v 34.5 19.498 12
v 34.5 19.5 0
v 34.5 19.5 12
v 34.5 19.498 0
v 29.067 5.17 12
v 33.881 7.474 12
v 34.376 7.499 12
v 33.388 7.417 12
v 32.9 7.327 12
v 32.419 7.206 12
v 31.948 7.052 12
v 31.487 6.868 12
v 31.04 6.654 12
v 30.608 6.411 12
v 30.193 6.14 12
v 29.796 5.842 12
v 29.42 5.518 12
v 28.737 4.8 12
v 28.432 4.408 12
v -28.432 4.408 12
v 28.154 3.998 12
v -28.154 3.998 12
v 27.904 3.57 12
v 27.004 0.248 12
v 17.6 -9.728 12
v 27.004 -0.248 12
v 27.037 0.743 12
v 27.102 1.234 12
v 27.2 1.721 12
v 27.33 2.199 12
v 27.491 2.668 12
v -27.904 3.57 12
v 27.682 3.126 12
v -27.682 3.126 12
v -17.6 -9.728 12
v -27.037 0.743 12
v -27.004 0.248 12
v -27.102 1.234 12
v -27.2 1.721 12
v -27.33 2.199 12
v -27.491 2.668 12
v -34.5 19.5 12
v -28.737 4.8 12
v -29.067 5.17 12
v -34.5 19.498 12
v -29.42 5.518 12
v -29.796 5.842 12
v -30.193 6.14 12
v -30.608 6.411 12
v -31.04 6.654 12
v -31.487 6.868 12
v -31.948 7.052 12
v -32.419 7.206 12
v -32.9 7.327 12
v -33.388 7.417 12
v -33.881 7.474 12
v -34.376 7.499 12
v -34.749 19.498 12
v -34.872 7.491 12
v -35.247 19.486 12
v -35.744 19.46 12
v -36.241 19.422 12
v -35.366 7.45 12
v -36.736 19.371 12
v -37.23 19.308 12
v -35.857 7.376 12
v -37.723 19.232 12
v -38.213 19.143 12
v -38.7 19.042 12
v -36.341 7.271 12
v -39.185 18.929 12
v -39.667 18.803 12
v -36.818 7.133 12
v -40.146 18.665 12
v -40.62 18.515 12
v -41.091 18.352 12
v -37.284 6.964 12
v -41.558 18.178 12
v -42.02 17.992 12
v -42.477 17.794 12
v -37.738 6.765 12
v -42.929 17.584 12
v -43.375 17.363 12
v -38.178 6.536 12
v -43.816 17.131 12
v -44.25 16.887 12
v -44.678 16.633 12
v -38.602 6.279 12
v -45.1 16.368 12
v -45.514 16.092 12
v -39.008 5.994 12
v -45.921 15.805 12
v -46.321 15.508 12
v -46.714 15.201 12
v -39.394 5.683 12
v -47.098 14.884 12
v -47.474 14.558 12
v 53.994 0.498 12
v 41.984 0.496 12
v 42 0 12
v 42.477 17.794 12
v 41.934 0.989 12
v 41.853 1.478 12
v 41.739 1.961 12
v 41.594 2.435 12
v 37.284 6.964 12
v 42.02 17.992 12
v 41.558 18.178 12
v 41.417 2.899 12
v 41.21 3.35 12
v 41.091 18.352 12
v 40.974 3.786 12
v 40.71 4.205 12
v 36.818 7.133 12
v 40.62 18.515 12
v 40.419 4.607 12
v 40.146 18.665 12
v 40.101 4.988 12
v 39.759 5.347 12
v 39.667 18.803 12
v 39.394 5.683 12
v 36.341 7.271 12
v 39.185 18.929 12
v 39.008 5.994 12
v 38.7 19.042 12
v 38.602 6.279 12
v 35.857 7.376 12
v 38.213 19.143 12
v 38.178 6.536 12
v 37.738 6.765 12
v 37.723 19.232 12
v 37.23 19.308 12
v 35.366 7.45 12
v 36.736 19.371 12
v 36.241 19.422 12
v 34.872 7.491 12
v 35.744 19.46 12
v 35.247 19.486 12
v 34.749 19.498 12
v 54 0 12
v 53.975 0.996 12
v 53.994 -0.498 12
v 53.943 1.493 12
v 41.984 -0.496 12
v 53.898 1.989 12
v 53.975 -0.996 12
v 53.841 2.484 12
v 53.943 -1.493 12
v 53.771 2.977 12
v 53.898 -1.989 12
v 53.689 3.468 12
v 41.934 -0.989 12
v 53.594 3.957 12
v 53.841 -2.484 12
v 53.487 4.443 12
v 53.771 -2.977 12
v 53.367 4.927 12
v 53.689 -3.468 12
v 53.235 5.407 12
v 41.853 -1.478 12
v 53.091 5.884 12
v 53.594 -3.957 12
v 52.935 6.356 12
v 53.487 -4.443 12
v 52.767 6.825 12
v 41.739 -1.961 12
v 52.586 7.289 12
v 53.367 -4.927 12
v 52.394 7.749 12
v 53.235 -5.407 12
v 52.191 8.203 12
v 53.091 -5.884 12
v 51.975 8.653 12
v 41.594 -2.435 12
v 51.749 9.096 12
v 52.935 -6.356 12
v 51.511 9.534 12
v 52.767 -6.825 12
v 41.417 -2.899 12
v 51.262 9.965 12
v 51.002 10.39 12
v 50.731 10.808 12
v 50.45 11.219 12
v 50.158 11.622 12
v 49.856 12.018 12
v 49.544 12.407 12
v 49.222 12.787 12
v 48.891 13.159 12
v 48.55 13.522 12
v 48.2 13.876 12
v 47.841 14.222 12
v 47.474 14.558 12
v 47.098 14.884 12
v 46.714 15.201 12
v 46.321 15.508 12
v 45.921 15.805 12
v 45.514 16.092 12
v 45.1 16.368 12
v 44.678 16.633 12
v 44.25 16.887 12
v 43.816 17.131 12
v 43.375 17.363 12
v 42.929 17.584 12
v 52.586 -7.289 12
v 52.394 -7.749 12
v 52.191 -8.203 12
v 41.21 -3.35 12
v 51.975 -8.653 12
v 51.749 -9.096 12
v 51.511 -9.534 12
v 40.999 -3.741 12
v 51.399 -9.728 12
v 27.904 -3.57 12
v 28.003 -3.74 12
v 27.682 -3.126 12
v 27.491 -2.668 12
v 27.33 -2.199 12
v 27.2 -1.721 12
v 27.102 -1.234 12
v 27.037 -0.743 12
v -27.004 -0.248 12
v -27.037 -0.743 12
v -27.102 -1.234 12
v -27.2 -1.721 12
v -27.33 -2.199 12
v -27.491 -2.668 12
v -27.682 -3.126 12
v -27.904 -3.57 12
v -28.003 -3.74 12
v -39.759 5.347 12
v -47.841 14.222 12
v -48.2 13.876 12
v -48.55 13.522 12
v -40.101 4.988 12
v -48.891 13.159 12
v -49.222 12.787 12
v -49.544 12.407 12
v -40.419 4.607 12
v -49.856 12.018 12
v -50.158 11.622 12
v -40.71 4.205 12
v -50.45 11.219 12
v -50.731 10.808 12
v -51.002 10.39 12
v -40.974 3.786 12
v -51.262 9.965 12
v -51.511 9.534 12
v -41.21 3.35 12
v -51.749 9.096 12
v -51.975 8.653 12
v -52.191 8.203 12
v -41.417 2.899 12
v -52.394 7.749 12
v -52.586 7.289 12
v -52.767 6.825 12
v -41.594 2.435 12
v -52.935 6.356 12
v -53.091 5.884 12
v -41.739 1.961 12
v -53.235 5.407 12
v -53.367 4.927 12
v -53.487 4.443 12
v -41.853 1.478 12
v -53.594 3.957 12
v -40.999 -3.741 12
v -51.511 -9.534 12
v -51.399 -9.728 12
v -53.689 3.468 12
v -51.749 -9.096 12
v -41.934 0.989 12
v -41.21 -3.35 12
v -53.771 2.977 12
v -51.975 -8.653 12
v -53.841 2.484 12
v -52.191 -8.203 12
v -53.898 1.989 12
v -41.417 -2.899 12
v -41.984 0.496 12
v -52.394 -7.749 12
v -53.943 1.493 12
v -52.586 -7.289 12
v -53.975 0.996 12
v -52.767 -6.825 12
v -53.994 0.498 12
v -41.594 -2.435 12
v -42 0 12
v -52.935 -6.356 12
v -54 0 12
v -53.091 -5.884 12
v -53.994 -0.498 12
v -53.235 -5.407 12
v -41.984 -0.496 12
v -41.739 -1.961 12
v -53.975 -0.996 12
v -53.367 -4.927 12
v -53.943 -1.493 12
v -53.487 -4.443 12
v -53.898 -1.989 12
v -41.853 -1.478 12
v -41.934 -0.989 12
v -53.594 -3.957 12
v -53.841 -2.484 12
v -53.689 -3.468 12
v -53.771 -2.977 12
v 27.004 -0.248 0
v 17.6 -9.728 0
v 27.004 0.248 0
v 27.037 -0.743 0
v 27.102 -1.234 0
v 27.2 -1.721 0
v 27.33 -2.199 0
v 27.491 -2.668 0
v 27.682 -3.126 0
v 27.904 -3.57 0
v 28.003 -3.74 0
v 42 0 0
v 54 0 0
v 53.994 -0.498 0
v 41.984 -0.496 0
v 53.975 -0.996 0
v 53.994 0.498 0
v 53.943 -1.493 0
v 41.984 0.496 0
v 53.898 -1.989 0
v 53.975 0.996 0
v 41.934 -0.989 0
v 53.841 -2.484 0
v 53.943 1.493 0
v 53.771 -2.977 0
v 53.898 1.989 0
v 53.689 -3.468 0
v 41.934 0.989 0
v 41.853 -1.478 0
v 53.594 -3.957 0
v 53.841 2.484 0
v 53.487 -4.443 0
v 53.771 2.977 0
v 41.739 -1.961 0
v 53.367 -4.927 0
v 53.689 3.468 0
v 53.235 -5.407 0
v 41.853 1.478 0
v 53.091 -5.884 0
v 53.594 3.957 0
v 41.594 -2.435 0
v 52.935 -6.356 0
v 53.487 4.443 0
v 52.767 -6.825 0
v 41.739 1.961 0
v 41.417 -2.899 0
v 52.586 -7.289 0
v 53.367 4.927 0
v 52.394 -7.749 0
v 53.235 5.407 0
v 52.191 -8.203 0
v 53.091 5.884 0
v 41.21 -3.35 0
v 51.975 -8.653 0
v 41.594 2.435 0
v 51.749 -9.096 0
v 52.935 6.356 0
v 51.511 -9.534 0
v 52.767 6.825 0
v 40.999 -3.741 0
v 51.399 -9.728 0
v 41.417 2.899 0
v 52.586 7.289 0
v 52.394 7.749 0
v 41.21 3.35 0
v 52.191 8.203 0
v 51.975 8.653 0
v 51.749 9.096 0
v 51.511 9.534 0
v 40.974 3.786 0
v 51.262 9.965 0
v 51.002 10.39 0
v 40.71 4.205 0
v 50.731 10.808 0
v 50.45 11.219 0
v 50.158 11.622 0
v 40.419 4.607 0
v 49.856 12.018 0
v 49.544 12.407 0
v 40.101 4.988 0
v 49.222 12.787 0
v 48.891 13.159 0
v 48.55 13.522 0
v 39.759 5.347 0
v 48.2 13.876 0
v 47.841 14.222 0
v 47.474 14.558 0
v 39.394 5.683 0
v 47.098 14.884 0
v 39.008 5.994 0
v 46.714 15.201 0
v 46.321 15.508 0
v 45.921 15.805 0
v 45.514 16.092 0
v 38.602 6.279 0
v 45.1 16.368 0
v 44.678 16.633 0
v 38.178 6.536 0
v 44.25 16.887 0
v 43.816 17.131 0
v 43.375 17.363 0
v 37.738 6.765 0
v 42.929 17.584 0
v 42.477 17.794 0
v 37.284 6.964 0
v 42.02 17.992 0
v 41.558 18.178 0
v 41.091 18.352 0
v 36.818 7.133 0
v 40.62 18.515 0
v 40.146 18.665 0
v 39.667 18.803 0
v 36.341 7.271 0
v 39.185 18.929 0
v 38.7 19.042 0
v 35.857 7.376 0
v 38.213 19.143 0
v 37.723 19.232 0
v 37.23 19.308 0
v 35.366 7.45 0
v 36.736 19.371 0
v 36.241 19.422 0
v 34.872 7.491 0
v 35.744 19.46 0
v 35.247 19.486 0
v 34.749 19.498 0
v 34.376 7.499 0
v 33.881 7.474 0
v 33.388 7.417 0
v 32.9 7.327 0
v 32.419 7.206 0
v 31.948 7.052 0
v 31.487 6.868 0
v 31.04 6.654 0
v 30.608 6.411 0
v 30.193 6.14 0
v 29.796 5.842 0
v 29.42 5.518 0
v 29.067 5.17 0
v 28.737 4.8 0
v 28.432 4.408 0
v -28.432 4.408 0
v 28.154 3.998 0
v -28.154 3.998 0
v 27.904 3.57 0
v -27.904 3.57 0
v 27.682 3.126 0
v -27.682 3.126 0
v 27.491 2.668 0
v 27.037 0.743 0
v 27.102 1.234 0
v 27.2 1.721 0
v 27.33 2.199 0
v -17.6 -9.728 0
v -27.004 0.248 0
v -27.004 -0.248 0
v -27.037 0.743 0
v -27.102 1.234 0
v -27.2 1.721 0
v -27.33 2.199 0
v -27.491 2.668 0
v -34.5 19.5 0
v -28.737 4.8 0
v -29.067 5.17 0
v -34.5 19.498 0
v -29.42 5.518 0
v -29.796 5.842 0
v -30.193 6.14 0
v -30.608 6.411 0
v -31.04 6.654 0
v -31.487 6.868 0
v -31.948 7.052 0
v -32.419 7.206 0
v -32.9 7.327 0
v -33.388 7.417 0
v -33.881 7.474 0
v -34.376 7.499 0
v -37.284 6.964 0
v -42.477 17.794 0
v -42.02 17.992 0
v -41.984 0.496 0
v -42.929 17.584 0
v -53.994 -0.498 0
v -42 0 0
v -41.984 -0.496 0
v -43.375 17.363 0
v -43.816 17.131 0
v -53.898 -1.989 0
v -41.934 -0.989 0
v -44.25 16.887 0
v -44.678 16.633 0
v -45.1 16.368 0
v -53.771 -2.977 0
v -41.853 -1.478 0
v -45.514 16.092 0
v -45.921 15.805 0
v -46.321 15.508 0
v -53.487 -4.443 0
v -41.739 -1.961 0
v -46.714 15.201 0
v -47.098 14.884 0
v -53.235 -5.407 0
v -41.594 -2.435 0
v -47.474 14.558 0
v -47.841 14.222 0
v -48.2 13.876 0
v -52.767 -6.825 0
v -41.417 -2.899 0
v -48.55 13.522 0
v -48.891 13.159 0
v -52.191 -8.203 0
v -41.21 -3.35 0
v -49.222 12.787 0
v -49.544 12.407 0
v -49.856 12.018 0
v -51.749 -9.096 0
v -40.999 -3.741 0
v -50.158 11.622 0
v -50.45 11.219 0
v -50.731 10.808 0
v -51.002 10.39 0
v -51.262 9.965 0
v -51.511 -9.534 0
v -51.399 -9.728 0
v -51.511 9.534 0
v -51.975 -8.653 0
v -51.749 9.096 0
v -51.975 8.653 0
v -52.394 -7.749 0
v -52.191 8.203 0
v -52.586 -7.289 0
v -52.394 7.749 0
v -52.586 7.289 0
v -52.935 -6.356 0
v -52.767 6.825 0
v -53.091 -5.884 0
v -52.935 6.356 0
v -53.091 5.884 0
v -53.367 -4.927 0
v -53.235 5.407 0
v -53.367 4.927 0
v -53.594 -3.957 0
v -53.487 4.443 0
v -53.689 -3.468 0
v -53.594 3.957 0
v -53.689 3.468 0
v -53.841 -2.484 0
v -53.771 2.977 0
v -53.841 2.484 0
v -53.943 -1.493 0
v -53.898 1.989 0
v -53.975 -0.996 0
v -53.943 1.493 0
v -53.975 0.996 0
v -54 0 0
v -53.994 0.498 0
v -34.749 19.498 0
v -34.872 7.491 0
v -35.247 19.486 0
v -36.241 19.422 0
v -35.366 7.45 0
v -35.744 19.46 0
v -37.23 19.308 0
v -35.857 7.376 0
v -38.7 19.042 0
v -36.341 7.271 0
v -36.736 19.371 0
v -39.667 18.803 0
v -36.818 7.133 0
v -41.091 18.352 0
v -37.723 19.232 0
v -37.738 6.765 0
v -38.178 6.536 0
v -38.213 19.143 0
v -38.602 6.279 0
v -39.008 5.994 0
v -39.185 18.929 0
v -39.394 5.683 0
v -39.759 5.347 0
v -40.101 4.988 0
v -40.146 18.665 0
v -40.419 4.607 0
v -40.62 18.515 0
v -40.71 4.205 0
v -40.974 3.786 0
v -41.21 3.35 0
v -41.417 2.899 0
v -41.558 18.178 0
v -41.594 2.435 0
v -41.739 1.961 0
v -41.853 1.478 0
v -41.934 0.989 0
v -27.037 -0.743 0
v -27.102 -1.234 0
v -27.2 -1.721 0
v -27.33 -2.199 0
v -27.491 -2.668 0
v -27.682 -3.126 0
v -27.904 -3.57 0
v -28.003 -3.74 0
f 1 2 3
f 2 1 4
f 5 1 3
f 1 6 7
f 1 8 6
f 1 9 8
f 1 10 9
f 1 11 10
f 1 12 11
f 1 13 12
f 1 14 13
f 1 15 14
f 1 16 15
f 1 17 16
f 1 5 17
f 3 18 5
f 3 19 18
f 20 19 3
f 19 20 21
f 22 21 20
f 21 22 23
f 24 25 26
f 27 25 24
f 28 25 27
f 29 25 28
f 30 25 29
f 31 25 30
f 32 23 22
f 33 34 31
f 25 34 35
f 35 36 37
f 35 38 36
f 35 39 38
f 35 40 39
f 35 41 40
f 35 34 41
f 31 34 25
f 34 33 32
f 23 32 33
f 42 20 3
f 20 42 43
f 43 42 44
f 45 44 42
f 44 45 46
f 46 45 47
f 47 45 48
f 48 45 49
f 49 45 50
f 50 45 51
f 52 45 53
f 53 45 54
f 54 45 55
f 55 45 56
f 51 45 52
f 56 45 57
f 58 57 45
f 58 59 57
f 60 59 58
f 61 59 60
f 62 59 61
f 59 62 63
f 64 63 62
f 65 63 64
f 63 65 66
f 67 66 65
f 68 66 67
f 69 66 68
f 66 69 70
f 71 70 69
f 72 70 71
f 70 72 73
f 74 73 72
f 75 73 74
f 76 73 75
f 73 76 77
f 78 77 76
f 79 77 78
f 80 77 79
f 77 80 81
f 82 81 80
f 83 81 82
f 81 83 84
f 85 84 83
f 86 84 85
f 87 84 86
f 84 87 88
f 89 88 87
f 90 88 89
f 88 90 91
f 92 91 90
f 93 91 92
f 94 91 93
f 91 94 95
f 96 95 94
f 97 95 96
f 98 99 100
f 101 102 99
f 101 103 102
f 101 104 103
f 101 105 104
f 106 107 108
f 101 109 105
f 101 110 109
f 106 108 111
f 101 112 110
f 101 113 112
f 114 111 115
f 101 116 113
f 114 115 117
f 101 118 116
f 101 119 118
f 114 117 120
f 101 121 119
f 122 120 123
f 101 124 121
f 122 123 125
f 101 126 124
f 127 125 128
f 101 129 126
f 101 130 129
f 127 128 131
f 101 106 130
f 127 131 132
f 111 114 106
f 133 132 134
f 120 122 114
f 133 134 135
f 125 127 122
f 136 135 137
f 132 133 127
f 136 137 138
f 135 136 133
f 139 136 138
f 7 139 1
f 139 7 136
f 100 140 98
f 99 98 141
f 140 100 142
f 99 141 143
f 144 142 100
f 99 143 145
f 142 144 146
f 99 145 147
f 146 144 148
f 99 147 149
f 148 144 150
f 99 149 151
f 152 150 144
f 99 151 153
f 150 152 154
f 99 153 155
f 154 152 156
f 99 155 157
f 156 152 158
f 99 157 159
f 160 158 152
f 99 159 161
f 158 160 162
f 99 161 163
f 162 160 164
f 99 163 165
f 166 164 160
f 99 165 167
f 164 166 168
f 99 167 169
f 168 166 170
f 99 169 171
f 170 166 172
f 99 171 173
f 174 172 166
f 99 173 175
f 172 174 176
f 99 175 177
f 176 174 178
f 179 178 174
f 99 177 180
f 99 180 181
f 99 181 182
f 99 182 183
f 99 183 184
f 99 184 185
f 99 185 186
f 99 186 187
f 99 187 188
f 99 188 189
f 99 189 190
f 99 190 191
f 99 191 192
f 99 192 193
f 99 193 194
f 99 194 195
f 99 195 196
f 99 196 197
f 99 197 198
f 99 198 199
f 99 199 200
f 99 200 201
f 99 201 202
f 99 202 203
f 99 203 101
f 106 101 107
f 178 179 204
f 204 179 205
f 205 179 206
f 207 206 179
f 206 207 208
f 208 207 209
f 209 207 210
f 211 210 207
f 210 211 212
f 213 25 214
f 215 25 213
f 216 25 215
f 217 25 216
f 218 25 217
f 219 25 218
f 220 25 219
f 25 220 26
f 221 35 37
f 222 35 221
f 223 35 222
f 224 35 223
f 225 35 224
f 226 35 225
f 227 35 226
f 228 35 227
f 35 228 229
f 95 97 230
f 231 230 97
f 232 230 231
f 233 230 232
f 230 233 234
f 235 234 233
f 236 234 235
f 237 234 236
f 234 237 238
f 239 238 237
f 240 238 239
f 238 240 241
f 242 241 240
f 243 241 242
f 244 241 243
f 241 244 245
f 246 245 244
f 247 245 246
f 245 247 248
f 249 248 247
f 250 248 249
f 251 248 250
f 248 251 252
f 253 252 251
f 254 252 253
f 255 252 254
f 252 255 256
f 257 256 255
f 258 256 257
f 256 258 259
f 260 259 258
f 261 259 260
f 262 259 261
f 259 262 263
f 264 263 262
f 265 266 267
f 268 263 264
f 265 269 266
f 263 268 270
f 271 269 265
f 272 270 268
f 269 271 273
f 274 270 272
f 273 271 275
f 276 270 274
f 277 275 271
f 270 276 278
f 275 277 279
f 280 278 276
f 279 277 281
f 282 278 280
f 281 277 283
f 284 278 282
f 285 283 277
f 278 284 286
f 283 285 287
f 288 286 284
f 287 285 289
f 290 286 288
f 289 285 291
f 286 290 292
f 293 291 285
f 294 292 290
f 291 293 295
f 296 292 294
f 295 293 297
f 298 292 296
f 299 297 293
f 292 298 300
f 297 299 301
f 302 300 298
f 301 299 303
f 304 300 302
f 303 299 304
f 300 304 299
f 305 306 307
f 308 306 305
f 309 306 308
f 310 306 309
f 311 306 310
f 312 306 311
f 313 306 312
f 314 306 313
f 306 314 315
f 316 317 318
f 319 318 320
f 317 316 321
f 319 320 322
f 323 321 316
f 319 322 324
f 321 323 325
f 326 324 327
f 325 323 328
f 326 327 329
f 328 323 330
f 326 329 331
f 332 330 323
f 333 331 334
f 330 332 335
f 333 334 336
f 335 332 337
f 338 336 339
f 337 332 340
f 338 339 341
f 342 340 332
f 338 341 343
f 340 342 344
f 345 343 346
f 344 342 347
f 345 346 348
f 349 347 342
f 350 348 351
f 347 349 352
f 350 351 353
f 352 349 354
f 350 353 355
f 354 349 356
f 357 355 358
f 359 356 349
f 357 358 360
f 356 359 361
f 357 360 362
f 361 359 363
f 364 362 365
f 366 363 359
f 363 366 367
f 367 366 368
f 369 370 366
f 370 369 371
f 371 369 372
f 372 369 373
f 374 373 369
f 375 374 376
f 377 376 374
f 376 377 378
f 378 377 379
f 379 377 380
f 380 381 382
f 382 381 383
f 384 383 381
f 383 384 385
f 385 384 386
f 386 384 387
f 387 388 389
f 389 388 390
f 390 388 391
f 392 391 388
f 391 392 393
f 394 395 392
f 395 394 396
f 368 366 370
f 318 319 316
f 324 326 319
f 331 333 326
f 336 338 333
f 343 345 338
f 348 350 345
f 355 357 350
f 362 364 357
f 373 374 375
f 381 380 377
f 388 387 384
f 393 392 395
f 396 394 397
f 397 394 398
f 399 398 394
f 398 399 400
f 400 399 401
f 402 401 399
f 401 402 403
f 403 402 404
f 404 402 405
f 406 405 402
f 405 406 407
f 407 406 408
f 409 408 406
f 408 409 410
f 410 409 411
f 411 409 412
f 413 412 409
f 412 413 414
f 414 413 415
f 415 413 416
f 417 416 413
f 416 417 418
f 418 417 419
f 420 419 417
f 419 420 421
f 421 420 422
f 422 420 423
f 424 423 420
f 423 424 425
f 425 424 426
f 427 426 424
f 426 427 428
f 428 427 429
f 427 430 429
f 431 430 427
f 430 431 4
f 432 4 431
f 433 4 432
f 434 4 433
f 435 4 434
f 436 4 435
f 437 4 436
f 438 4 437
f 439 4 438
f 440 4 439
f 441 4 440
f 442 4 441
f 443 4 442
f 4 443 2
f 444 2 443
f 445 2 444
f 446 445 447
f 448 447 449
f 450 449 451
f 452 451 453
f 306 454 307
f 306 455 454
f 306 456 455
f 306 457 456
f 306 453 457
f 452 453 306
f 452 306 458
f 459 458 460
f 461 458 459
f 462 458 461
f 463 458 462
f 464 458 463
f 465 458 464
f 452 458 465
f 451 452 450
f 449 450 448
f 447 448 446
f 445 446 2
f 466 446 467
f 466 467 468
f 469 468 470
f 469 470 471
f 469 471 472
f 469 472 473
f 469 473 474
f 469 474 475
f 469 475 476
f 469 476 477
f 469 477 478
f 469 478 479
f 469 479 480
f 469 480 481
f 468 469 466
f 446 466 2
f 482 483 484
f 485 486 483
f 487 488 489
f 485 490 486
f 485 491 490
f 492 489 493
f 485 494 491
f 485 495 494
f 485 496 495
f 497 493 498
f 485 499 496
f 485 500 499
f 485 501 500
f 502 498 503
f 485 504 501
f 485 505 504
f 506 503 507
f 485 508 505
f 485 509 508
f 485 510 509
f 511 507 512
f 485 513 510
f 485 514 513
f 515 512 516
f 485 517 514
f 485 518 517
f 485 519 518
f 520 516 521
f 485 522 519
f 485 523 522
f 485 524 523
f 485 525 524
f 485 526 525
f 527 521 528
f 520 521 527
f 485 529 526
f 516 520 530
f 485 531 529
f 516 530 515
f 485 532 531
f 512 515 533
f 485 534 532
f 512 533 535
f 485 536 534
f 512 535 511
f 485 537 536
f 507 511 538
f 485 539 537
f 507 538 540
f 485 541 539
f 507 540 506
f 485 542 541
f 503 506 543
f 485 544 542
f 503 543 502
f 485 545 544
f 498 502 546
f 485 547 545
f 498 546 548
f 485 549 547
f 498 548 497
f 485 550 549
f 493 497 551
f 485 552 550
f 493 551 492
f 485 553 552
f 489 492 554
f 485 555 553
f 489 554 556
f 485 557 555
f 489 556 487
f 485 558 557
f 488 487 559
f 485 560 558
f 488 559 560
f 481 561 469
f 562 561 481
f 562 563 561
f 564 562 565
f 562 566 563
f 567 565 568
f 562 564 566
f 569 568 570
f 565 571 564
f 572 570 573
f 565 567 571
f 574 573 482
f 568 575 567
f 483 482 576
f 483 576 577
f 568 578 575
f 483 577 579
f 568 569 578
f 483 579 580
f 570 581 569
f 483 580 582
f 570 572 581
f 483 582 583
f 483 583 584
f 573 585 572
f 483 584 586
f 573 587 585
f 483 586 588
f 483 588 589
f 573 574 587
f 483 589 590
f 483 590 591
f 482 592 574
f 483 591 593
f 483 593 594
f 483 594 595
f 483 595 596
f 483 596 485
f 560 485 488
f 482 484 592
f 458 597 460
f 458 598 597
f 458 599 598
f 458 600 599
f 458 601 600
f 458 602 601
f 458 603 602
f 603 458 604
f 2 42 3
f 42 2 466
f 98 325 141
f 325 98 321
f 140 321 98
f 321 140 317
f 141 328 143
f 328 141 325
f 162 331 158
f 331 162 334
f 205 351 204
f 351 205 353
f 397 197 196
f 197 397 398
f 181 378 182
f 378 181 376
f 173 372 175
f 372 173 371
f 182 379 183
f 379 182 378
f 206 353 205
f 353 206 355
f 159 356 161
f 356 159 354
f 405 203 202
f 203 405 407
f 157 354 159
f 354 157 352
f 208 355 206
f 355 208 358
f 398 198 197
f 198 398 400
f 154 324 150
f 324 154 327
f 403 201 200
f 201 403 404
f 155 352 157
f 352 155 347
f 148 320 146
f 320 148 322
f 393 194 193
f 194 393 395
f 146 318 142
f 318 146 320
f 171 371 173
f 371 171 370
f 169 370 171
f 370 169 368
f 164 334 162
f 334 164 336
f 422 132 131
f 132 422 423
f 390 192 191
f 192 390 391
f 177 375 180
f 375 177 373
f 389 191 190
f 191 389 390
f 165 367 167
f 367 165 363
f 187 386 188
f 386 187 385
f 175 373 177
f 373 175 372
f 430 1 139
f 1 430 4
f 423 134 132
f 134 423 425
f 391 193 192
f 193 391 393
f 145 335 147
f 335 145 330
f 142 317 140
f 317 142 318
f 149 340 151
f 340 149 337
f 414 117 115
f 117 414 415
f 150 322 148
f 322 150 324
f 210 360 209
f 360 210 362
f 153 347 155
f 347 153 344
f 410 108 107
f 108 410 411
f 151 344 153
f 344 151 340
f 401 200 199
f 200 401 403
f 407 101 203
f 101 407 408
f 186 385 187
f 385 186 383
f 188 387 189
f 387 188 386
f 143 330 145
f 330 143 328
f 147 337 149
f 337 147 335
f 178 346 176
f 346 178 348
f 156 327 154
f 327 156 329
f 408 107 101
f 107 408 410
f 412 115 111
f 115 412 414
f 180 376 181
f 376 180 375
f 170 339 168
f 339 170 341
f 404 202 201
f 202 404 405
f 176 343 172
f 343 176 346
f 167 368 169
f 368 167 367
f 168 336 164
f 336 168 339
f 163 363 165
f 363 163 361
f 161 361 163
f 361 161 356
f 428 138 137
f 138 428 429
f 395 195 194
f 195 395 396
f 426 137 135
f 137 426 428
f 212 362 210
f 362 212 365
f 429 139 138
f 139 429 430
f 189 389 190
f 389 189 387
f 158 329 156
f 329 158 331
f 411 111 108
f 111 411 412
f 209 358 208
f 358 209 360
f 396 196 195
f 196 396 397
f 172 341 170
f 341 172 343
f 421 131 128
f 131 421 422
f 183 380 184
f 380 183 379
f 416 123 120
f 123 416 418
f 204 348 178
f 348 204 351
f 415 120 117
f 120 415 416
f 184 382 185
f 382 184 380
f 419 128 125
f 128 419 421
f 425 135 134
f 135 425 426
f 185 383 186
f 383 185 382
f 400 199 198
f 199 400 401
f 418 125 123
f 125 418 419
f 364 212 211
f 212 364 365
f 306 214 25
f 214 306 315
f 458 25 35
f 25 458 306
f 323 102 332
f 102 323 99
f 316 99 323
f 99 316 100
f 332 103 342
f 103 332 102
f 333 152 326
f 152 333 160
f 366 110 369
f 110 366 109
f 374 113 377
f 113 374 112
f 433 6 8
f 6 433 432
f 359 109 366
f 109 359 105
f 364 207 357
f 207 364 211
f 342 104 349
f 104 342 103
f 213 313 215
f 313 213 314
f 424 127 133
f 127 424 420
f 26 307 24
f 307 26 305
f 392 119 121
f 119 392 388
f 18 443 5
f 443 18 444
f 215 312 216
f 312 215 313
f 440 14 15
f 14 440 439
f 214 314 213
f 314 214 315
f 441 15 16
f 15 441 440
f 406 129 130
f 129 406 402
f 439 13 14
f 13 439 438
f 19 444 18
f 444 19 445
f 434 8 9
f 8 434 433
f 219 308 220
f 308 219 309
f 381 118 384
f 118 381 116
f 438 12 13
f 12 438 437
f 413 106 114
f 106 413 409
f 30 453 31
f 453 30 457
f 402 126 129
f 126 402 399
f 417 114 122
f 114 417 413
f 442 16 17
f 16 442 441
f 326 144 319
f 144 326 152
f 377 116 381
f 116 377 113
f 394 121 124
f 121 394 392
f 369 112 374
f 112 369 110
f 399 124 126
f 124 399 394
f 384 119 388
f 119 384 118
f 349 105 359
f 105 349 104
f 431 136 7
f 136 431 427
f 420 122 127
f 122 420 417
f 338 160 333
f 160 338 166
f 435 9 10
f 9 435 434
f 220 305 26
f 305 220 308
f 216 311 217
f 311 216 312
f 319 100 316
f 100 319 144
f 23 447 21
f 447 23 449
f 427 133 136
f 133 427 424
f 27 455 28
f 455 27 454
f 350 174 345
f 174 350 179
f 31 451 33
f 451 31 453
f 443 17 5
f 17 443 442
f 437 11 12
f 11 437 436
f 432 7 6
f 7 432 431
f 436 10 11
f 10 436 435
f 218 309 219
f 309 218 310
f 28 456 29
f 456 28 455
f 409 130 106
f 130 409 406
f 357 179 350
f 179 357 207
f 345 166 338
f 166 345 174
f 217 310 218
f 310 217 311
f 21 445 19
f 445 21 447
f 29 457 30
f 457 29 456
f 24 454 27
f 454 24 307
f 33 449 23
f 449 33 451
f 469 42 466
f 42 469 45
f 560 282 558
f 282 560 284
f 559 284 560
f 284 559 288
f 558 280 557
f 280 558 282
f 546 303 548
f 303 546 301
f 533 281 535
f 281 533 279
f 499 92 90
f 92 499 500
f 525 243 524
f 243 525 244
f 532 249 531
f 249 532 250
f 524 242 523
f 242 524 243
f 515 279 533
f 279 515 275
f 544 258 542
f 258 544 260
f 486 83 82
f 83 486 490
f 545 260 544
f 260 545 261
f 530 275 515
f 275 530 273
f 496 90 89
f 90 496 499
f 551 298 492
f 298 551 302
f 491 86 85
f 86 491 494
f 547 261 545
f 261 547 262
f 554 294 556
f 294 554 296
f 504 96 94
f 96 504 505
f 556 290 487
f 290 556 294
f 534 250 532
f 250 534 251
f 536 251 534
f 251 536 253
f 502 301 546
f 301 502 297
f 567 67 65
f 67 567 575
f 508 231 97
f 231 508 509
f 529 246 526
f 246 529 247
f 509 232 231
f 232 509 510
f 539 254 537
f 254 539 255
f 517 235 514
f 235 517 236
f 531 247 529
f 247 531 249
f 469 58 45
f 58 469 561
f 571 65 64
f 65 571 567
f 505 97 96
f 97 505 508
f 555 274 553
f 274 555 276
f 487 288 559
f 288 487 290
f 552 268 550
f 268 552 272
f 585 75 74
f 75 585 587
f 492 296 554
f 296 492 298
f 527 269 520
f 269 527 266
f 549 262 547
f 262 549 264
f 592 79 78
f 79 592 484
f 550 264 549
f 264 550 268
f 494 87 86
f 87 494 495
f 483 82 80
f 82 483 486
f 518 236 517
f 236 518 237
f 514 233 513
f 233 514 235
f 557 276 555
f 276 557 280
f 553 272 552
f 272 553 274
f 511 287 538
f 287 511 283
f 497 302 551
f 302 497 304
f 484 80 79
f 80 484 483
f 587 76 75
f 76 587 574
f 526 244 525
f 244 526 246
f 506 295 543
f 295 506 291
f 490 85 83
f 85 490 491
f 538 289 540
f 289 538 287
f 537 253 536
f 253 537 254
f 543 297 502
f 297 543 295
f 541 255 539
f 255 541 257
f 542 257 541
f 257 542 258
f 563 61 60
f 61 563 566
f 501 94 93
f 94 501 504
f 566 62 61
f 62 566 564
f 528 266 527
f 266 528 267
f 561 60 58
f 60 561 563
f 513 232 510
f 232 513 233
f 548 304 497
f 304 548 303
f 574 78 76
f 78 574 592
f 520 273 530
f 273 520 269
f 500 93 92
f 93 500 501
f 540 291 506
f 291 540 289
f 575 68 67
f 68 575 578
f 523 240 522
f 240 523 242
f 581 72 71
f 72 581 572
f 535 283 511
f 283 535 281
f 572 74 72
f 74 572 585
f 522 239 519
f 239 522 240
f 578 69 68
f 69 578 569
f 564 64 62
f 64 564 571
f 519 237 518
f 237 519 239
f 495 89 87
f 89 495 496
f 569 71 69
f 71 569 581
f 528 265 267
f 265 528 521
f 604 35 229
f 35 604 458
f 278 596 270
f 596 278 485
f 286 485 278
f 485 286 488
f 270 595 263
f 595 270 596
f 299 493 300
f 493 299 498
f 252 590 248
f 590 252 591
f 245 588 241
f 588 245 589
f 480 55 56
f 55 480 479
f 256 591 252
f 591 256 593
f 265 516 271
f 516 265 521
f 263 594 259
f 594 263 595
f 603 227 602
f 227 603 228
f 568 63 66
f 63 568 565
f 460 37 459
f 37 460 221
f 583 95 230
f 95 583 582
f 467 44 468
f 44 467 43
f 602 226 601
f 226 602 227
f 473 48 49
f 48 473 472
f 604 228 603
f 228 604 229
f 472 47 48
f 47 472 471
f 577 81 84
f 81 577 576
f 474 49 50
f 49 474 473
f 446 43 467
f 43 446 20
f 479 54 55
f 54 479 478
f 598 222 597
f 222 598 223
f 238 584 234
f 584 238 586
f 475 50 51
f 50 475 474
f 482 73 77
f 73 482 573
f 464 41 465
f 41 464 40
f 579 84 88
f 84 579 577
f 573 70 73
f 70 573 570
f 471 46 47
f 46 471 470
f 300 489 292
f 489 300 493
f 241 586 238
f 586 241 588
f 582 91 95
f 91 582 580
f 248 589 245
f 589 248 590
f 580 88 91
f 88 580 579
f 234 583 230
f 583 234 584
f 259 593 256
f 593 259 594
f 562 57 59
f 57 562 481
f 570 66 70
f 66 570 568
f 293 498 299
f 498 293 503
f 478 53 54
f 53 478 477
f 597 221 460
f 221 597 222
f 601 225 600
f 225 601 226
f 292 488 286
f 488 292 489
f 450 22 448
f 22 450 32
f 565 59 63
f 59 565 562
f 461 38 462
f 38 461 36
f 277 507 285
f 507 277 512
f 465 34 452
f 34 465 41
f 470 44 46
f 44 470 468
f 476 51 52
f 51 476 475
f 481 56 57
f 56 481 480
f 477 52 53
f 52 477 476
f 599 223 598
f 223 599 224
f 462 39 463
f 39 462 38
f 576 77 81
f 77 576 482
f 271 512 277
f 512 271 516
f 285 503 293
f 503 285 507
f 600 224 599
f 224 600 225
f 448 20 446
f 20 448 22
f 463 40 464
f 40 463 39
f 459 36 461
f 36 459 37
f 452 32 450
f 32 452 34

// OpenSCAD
// [FL_INDEX: keywords="openscad, 3d_parametric, Customizable_cupboard_locking_bolt_like_thingie, csg_solid" | COT="Parametric OpenSCAD design from 3DCodeverse"]
// Title: Customizable cupboard locking bolt like thingie

//
// Customizable cupboard locking bolt like thingie
// Print lying down for better sturdiness
//
// Copyright 2014 Magnus Kvevlander <magu@me.com>
//
// Creative Commons Attribution-NonCommercial 3.0 Unported (CC BY-NC 3.0)
// http://creativecommons.org/licenses/by-nc/3.0/
//


//
// Base variables
//

// Material thickness in mm. Don't make it too thin.
thk = 12;

// Distance between centers of holes in mm.
hdist = 69;

// Hole diameter in mm.
hdia = 15;

// Width of gap in mm.
gap = 13;


/* [Hidden] */

//
// Rendering magick
//

$fa = 0.01;	// Minimum fragment angle
$fs = 0.5;	// Minimum fragment size
$fn = 0;		// Number of corners in a full circle (shan't be used)

// Hole radius
hrad = hdia / 2;
// Angle of gap cutout
gap_angle = asin ((gap / 2) / hrad);
// Base of cutout triangle
gap_slice_base = (hrad + 1.5 * thk) * tan (gap_angle);
// Offset of compensational cut of bridge part
bridge_cut_offset = (hrad + thk) * sin (90 - gap_angle);

// Render
half_piece ();
mirror ([1,0,0])
	half_piece ();

module half_piece () {
	translate ([0, - hrad - thk, 0])
		difference () {
			// Base shape
			union () {
				// Cuboid
				cube ([hdist / 2, 2 * (hrad + thk), thk]);
				// Rounded edges
				translate ([hdist / 2, hrad + thk, 0])
					cylinder (h = thk, r = hrad + thk);
			}
		
			// Knob hole
			translate ([hdist / 2, hrad + thk, - thk / 2])
				cylinder (h = 2 * thk, r = hrad);

			// Gap
			translate ([0, 0, - thk / 2])
				union () {
					// Triangle
					linear_extrude (height = 2 * thk)
						polygon(points = [[hdist / 2, hrad + thk], [hdist / 2 - gap_slice_base, - thk / 2], [hdist / 2 + gap_slice_base, - thk / 2]]);

					// Bridge cut
						translate ([- thk / 2, - thk / 2, 0])
							cube ([hdist / 2 + thk, hrad + 1.5 * thk - bridge_cut_offset, 2 * thk]);
				}
		}
}
